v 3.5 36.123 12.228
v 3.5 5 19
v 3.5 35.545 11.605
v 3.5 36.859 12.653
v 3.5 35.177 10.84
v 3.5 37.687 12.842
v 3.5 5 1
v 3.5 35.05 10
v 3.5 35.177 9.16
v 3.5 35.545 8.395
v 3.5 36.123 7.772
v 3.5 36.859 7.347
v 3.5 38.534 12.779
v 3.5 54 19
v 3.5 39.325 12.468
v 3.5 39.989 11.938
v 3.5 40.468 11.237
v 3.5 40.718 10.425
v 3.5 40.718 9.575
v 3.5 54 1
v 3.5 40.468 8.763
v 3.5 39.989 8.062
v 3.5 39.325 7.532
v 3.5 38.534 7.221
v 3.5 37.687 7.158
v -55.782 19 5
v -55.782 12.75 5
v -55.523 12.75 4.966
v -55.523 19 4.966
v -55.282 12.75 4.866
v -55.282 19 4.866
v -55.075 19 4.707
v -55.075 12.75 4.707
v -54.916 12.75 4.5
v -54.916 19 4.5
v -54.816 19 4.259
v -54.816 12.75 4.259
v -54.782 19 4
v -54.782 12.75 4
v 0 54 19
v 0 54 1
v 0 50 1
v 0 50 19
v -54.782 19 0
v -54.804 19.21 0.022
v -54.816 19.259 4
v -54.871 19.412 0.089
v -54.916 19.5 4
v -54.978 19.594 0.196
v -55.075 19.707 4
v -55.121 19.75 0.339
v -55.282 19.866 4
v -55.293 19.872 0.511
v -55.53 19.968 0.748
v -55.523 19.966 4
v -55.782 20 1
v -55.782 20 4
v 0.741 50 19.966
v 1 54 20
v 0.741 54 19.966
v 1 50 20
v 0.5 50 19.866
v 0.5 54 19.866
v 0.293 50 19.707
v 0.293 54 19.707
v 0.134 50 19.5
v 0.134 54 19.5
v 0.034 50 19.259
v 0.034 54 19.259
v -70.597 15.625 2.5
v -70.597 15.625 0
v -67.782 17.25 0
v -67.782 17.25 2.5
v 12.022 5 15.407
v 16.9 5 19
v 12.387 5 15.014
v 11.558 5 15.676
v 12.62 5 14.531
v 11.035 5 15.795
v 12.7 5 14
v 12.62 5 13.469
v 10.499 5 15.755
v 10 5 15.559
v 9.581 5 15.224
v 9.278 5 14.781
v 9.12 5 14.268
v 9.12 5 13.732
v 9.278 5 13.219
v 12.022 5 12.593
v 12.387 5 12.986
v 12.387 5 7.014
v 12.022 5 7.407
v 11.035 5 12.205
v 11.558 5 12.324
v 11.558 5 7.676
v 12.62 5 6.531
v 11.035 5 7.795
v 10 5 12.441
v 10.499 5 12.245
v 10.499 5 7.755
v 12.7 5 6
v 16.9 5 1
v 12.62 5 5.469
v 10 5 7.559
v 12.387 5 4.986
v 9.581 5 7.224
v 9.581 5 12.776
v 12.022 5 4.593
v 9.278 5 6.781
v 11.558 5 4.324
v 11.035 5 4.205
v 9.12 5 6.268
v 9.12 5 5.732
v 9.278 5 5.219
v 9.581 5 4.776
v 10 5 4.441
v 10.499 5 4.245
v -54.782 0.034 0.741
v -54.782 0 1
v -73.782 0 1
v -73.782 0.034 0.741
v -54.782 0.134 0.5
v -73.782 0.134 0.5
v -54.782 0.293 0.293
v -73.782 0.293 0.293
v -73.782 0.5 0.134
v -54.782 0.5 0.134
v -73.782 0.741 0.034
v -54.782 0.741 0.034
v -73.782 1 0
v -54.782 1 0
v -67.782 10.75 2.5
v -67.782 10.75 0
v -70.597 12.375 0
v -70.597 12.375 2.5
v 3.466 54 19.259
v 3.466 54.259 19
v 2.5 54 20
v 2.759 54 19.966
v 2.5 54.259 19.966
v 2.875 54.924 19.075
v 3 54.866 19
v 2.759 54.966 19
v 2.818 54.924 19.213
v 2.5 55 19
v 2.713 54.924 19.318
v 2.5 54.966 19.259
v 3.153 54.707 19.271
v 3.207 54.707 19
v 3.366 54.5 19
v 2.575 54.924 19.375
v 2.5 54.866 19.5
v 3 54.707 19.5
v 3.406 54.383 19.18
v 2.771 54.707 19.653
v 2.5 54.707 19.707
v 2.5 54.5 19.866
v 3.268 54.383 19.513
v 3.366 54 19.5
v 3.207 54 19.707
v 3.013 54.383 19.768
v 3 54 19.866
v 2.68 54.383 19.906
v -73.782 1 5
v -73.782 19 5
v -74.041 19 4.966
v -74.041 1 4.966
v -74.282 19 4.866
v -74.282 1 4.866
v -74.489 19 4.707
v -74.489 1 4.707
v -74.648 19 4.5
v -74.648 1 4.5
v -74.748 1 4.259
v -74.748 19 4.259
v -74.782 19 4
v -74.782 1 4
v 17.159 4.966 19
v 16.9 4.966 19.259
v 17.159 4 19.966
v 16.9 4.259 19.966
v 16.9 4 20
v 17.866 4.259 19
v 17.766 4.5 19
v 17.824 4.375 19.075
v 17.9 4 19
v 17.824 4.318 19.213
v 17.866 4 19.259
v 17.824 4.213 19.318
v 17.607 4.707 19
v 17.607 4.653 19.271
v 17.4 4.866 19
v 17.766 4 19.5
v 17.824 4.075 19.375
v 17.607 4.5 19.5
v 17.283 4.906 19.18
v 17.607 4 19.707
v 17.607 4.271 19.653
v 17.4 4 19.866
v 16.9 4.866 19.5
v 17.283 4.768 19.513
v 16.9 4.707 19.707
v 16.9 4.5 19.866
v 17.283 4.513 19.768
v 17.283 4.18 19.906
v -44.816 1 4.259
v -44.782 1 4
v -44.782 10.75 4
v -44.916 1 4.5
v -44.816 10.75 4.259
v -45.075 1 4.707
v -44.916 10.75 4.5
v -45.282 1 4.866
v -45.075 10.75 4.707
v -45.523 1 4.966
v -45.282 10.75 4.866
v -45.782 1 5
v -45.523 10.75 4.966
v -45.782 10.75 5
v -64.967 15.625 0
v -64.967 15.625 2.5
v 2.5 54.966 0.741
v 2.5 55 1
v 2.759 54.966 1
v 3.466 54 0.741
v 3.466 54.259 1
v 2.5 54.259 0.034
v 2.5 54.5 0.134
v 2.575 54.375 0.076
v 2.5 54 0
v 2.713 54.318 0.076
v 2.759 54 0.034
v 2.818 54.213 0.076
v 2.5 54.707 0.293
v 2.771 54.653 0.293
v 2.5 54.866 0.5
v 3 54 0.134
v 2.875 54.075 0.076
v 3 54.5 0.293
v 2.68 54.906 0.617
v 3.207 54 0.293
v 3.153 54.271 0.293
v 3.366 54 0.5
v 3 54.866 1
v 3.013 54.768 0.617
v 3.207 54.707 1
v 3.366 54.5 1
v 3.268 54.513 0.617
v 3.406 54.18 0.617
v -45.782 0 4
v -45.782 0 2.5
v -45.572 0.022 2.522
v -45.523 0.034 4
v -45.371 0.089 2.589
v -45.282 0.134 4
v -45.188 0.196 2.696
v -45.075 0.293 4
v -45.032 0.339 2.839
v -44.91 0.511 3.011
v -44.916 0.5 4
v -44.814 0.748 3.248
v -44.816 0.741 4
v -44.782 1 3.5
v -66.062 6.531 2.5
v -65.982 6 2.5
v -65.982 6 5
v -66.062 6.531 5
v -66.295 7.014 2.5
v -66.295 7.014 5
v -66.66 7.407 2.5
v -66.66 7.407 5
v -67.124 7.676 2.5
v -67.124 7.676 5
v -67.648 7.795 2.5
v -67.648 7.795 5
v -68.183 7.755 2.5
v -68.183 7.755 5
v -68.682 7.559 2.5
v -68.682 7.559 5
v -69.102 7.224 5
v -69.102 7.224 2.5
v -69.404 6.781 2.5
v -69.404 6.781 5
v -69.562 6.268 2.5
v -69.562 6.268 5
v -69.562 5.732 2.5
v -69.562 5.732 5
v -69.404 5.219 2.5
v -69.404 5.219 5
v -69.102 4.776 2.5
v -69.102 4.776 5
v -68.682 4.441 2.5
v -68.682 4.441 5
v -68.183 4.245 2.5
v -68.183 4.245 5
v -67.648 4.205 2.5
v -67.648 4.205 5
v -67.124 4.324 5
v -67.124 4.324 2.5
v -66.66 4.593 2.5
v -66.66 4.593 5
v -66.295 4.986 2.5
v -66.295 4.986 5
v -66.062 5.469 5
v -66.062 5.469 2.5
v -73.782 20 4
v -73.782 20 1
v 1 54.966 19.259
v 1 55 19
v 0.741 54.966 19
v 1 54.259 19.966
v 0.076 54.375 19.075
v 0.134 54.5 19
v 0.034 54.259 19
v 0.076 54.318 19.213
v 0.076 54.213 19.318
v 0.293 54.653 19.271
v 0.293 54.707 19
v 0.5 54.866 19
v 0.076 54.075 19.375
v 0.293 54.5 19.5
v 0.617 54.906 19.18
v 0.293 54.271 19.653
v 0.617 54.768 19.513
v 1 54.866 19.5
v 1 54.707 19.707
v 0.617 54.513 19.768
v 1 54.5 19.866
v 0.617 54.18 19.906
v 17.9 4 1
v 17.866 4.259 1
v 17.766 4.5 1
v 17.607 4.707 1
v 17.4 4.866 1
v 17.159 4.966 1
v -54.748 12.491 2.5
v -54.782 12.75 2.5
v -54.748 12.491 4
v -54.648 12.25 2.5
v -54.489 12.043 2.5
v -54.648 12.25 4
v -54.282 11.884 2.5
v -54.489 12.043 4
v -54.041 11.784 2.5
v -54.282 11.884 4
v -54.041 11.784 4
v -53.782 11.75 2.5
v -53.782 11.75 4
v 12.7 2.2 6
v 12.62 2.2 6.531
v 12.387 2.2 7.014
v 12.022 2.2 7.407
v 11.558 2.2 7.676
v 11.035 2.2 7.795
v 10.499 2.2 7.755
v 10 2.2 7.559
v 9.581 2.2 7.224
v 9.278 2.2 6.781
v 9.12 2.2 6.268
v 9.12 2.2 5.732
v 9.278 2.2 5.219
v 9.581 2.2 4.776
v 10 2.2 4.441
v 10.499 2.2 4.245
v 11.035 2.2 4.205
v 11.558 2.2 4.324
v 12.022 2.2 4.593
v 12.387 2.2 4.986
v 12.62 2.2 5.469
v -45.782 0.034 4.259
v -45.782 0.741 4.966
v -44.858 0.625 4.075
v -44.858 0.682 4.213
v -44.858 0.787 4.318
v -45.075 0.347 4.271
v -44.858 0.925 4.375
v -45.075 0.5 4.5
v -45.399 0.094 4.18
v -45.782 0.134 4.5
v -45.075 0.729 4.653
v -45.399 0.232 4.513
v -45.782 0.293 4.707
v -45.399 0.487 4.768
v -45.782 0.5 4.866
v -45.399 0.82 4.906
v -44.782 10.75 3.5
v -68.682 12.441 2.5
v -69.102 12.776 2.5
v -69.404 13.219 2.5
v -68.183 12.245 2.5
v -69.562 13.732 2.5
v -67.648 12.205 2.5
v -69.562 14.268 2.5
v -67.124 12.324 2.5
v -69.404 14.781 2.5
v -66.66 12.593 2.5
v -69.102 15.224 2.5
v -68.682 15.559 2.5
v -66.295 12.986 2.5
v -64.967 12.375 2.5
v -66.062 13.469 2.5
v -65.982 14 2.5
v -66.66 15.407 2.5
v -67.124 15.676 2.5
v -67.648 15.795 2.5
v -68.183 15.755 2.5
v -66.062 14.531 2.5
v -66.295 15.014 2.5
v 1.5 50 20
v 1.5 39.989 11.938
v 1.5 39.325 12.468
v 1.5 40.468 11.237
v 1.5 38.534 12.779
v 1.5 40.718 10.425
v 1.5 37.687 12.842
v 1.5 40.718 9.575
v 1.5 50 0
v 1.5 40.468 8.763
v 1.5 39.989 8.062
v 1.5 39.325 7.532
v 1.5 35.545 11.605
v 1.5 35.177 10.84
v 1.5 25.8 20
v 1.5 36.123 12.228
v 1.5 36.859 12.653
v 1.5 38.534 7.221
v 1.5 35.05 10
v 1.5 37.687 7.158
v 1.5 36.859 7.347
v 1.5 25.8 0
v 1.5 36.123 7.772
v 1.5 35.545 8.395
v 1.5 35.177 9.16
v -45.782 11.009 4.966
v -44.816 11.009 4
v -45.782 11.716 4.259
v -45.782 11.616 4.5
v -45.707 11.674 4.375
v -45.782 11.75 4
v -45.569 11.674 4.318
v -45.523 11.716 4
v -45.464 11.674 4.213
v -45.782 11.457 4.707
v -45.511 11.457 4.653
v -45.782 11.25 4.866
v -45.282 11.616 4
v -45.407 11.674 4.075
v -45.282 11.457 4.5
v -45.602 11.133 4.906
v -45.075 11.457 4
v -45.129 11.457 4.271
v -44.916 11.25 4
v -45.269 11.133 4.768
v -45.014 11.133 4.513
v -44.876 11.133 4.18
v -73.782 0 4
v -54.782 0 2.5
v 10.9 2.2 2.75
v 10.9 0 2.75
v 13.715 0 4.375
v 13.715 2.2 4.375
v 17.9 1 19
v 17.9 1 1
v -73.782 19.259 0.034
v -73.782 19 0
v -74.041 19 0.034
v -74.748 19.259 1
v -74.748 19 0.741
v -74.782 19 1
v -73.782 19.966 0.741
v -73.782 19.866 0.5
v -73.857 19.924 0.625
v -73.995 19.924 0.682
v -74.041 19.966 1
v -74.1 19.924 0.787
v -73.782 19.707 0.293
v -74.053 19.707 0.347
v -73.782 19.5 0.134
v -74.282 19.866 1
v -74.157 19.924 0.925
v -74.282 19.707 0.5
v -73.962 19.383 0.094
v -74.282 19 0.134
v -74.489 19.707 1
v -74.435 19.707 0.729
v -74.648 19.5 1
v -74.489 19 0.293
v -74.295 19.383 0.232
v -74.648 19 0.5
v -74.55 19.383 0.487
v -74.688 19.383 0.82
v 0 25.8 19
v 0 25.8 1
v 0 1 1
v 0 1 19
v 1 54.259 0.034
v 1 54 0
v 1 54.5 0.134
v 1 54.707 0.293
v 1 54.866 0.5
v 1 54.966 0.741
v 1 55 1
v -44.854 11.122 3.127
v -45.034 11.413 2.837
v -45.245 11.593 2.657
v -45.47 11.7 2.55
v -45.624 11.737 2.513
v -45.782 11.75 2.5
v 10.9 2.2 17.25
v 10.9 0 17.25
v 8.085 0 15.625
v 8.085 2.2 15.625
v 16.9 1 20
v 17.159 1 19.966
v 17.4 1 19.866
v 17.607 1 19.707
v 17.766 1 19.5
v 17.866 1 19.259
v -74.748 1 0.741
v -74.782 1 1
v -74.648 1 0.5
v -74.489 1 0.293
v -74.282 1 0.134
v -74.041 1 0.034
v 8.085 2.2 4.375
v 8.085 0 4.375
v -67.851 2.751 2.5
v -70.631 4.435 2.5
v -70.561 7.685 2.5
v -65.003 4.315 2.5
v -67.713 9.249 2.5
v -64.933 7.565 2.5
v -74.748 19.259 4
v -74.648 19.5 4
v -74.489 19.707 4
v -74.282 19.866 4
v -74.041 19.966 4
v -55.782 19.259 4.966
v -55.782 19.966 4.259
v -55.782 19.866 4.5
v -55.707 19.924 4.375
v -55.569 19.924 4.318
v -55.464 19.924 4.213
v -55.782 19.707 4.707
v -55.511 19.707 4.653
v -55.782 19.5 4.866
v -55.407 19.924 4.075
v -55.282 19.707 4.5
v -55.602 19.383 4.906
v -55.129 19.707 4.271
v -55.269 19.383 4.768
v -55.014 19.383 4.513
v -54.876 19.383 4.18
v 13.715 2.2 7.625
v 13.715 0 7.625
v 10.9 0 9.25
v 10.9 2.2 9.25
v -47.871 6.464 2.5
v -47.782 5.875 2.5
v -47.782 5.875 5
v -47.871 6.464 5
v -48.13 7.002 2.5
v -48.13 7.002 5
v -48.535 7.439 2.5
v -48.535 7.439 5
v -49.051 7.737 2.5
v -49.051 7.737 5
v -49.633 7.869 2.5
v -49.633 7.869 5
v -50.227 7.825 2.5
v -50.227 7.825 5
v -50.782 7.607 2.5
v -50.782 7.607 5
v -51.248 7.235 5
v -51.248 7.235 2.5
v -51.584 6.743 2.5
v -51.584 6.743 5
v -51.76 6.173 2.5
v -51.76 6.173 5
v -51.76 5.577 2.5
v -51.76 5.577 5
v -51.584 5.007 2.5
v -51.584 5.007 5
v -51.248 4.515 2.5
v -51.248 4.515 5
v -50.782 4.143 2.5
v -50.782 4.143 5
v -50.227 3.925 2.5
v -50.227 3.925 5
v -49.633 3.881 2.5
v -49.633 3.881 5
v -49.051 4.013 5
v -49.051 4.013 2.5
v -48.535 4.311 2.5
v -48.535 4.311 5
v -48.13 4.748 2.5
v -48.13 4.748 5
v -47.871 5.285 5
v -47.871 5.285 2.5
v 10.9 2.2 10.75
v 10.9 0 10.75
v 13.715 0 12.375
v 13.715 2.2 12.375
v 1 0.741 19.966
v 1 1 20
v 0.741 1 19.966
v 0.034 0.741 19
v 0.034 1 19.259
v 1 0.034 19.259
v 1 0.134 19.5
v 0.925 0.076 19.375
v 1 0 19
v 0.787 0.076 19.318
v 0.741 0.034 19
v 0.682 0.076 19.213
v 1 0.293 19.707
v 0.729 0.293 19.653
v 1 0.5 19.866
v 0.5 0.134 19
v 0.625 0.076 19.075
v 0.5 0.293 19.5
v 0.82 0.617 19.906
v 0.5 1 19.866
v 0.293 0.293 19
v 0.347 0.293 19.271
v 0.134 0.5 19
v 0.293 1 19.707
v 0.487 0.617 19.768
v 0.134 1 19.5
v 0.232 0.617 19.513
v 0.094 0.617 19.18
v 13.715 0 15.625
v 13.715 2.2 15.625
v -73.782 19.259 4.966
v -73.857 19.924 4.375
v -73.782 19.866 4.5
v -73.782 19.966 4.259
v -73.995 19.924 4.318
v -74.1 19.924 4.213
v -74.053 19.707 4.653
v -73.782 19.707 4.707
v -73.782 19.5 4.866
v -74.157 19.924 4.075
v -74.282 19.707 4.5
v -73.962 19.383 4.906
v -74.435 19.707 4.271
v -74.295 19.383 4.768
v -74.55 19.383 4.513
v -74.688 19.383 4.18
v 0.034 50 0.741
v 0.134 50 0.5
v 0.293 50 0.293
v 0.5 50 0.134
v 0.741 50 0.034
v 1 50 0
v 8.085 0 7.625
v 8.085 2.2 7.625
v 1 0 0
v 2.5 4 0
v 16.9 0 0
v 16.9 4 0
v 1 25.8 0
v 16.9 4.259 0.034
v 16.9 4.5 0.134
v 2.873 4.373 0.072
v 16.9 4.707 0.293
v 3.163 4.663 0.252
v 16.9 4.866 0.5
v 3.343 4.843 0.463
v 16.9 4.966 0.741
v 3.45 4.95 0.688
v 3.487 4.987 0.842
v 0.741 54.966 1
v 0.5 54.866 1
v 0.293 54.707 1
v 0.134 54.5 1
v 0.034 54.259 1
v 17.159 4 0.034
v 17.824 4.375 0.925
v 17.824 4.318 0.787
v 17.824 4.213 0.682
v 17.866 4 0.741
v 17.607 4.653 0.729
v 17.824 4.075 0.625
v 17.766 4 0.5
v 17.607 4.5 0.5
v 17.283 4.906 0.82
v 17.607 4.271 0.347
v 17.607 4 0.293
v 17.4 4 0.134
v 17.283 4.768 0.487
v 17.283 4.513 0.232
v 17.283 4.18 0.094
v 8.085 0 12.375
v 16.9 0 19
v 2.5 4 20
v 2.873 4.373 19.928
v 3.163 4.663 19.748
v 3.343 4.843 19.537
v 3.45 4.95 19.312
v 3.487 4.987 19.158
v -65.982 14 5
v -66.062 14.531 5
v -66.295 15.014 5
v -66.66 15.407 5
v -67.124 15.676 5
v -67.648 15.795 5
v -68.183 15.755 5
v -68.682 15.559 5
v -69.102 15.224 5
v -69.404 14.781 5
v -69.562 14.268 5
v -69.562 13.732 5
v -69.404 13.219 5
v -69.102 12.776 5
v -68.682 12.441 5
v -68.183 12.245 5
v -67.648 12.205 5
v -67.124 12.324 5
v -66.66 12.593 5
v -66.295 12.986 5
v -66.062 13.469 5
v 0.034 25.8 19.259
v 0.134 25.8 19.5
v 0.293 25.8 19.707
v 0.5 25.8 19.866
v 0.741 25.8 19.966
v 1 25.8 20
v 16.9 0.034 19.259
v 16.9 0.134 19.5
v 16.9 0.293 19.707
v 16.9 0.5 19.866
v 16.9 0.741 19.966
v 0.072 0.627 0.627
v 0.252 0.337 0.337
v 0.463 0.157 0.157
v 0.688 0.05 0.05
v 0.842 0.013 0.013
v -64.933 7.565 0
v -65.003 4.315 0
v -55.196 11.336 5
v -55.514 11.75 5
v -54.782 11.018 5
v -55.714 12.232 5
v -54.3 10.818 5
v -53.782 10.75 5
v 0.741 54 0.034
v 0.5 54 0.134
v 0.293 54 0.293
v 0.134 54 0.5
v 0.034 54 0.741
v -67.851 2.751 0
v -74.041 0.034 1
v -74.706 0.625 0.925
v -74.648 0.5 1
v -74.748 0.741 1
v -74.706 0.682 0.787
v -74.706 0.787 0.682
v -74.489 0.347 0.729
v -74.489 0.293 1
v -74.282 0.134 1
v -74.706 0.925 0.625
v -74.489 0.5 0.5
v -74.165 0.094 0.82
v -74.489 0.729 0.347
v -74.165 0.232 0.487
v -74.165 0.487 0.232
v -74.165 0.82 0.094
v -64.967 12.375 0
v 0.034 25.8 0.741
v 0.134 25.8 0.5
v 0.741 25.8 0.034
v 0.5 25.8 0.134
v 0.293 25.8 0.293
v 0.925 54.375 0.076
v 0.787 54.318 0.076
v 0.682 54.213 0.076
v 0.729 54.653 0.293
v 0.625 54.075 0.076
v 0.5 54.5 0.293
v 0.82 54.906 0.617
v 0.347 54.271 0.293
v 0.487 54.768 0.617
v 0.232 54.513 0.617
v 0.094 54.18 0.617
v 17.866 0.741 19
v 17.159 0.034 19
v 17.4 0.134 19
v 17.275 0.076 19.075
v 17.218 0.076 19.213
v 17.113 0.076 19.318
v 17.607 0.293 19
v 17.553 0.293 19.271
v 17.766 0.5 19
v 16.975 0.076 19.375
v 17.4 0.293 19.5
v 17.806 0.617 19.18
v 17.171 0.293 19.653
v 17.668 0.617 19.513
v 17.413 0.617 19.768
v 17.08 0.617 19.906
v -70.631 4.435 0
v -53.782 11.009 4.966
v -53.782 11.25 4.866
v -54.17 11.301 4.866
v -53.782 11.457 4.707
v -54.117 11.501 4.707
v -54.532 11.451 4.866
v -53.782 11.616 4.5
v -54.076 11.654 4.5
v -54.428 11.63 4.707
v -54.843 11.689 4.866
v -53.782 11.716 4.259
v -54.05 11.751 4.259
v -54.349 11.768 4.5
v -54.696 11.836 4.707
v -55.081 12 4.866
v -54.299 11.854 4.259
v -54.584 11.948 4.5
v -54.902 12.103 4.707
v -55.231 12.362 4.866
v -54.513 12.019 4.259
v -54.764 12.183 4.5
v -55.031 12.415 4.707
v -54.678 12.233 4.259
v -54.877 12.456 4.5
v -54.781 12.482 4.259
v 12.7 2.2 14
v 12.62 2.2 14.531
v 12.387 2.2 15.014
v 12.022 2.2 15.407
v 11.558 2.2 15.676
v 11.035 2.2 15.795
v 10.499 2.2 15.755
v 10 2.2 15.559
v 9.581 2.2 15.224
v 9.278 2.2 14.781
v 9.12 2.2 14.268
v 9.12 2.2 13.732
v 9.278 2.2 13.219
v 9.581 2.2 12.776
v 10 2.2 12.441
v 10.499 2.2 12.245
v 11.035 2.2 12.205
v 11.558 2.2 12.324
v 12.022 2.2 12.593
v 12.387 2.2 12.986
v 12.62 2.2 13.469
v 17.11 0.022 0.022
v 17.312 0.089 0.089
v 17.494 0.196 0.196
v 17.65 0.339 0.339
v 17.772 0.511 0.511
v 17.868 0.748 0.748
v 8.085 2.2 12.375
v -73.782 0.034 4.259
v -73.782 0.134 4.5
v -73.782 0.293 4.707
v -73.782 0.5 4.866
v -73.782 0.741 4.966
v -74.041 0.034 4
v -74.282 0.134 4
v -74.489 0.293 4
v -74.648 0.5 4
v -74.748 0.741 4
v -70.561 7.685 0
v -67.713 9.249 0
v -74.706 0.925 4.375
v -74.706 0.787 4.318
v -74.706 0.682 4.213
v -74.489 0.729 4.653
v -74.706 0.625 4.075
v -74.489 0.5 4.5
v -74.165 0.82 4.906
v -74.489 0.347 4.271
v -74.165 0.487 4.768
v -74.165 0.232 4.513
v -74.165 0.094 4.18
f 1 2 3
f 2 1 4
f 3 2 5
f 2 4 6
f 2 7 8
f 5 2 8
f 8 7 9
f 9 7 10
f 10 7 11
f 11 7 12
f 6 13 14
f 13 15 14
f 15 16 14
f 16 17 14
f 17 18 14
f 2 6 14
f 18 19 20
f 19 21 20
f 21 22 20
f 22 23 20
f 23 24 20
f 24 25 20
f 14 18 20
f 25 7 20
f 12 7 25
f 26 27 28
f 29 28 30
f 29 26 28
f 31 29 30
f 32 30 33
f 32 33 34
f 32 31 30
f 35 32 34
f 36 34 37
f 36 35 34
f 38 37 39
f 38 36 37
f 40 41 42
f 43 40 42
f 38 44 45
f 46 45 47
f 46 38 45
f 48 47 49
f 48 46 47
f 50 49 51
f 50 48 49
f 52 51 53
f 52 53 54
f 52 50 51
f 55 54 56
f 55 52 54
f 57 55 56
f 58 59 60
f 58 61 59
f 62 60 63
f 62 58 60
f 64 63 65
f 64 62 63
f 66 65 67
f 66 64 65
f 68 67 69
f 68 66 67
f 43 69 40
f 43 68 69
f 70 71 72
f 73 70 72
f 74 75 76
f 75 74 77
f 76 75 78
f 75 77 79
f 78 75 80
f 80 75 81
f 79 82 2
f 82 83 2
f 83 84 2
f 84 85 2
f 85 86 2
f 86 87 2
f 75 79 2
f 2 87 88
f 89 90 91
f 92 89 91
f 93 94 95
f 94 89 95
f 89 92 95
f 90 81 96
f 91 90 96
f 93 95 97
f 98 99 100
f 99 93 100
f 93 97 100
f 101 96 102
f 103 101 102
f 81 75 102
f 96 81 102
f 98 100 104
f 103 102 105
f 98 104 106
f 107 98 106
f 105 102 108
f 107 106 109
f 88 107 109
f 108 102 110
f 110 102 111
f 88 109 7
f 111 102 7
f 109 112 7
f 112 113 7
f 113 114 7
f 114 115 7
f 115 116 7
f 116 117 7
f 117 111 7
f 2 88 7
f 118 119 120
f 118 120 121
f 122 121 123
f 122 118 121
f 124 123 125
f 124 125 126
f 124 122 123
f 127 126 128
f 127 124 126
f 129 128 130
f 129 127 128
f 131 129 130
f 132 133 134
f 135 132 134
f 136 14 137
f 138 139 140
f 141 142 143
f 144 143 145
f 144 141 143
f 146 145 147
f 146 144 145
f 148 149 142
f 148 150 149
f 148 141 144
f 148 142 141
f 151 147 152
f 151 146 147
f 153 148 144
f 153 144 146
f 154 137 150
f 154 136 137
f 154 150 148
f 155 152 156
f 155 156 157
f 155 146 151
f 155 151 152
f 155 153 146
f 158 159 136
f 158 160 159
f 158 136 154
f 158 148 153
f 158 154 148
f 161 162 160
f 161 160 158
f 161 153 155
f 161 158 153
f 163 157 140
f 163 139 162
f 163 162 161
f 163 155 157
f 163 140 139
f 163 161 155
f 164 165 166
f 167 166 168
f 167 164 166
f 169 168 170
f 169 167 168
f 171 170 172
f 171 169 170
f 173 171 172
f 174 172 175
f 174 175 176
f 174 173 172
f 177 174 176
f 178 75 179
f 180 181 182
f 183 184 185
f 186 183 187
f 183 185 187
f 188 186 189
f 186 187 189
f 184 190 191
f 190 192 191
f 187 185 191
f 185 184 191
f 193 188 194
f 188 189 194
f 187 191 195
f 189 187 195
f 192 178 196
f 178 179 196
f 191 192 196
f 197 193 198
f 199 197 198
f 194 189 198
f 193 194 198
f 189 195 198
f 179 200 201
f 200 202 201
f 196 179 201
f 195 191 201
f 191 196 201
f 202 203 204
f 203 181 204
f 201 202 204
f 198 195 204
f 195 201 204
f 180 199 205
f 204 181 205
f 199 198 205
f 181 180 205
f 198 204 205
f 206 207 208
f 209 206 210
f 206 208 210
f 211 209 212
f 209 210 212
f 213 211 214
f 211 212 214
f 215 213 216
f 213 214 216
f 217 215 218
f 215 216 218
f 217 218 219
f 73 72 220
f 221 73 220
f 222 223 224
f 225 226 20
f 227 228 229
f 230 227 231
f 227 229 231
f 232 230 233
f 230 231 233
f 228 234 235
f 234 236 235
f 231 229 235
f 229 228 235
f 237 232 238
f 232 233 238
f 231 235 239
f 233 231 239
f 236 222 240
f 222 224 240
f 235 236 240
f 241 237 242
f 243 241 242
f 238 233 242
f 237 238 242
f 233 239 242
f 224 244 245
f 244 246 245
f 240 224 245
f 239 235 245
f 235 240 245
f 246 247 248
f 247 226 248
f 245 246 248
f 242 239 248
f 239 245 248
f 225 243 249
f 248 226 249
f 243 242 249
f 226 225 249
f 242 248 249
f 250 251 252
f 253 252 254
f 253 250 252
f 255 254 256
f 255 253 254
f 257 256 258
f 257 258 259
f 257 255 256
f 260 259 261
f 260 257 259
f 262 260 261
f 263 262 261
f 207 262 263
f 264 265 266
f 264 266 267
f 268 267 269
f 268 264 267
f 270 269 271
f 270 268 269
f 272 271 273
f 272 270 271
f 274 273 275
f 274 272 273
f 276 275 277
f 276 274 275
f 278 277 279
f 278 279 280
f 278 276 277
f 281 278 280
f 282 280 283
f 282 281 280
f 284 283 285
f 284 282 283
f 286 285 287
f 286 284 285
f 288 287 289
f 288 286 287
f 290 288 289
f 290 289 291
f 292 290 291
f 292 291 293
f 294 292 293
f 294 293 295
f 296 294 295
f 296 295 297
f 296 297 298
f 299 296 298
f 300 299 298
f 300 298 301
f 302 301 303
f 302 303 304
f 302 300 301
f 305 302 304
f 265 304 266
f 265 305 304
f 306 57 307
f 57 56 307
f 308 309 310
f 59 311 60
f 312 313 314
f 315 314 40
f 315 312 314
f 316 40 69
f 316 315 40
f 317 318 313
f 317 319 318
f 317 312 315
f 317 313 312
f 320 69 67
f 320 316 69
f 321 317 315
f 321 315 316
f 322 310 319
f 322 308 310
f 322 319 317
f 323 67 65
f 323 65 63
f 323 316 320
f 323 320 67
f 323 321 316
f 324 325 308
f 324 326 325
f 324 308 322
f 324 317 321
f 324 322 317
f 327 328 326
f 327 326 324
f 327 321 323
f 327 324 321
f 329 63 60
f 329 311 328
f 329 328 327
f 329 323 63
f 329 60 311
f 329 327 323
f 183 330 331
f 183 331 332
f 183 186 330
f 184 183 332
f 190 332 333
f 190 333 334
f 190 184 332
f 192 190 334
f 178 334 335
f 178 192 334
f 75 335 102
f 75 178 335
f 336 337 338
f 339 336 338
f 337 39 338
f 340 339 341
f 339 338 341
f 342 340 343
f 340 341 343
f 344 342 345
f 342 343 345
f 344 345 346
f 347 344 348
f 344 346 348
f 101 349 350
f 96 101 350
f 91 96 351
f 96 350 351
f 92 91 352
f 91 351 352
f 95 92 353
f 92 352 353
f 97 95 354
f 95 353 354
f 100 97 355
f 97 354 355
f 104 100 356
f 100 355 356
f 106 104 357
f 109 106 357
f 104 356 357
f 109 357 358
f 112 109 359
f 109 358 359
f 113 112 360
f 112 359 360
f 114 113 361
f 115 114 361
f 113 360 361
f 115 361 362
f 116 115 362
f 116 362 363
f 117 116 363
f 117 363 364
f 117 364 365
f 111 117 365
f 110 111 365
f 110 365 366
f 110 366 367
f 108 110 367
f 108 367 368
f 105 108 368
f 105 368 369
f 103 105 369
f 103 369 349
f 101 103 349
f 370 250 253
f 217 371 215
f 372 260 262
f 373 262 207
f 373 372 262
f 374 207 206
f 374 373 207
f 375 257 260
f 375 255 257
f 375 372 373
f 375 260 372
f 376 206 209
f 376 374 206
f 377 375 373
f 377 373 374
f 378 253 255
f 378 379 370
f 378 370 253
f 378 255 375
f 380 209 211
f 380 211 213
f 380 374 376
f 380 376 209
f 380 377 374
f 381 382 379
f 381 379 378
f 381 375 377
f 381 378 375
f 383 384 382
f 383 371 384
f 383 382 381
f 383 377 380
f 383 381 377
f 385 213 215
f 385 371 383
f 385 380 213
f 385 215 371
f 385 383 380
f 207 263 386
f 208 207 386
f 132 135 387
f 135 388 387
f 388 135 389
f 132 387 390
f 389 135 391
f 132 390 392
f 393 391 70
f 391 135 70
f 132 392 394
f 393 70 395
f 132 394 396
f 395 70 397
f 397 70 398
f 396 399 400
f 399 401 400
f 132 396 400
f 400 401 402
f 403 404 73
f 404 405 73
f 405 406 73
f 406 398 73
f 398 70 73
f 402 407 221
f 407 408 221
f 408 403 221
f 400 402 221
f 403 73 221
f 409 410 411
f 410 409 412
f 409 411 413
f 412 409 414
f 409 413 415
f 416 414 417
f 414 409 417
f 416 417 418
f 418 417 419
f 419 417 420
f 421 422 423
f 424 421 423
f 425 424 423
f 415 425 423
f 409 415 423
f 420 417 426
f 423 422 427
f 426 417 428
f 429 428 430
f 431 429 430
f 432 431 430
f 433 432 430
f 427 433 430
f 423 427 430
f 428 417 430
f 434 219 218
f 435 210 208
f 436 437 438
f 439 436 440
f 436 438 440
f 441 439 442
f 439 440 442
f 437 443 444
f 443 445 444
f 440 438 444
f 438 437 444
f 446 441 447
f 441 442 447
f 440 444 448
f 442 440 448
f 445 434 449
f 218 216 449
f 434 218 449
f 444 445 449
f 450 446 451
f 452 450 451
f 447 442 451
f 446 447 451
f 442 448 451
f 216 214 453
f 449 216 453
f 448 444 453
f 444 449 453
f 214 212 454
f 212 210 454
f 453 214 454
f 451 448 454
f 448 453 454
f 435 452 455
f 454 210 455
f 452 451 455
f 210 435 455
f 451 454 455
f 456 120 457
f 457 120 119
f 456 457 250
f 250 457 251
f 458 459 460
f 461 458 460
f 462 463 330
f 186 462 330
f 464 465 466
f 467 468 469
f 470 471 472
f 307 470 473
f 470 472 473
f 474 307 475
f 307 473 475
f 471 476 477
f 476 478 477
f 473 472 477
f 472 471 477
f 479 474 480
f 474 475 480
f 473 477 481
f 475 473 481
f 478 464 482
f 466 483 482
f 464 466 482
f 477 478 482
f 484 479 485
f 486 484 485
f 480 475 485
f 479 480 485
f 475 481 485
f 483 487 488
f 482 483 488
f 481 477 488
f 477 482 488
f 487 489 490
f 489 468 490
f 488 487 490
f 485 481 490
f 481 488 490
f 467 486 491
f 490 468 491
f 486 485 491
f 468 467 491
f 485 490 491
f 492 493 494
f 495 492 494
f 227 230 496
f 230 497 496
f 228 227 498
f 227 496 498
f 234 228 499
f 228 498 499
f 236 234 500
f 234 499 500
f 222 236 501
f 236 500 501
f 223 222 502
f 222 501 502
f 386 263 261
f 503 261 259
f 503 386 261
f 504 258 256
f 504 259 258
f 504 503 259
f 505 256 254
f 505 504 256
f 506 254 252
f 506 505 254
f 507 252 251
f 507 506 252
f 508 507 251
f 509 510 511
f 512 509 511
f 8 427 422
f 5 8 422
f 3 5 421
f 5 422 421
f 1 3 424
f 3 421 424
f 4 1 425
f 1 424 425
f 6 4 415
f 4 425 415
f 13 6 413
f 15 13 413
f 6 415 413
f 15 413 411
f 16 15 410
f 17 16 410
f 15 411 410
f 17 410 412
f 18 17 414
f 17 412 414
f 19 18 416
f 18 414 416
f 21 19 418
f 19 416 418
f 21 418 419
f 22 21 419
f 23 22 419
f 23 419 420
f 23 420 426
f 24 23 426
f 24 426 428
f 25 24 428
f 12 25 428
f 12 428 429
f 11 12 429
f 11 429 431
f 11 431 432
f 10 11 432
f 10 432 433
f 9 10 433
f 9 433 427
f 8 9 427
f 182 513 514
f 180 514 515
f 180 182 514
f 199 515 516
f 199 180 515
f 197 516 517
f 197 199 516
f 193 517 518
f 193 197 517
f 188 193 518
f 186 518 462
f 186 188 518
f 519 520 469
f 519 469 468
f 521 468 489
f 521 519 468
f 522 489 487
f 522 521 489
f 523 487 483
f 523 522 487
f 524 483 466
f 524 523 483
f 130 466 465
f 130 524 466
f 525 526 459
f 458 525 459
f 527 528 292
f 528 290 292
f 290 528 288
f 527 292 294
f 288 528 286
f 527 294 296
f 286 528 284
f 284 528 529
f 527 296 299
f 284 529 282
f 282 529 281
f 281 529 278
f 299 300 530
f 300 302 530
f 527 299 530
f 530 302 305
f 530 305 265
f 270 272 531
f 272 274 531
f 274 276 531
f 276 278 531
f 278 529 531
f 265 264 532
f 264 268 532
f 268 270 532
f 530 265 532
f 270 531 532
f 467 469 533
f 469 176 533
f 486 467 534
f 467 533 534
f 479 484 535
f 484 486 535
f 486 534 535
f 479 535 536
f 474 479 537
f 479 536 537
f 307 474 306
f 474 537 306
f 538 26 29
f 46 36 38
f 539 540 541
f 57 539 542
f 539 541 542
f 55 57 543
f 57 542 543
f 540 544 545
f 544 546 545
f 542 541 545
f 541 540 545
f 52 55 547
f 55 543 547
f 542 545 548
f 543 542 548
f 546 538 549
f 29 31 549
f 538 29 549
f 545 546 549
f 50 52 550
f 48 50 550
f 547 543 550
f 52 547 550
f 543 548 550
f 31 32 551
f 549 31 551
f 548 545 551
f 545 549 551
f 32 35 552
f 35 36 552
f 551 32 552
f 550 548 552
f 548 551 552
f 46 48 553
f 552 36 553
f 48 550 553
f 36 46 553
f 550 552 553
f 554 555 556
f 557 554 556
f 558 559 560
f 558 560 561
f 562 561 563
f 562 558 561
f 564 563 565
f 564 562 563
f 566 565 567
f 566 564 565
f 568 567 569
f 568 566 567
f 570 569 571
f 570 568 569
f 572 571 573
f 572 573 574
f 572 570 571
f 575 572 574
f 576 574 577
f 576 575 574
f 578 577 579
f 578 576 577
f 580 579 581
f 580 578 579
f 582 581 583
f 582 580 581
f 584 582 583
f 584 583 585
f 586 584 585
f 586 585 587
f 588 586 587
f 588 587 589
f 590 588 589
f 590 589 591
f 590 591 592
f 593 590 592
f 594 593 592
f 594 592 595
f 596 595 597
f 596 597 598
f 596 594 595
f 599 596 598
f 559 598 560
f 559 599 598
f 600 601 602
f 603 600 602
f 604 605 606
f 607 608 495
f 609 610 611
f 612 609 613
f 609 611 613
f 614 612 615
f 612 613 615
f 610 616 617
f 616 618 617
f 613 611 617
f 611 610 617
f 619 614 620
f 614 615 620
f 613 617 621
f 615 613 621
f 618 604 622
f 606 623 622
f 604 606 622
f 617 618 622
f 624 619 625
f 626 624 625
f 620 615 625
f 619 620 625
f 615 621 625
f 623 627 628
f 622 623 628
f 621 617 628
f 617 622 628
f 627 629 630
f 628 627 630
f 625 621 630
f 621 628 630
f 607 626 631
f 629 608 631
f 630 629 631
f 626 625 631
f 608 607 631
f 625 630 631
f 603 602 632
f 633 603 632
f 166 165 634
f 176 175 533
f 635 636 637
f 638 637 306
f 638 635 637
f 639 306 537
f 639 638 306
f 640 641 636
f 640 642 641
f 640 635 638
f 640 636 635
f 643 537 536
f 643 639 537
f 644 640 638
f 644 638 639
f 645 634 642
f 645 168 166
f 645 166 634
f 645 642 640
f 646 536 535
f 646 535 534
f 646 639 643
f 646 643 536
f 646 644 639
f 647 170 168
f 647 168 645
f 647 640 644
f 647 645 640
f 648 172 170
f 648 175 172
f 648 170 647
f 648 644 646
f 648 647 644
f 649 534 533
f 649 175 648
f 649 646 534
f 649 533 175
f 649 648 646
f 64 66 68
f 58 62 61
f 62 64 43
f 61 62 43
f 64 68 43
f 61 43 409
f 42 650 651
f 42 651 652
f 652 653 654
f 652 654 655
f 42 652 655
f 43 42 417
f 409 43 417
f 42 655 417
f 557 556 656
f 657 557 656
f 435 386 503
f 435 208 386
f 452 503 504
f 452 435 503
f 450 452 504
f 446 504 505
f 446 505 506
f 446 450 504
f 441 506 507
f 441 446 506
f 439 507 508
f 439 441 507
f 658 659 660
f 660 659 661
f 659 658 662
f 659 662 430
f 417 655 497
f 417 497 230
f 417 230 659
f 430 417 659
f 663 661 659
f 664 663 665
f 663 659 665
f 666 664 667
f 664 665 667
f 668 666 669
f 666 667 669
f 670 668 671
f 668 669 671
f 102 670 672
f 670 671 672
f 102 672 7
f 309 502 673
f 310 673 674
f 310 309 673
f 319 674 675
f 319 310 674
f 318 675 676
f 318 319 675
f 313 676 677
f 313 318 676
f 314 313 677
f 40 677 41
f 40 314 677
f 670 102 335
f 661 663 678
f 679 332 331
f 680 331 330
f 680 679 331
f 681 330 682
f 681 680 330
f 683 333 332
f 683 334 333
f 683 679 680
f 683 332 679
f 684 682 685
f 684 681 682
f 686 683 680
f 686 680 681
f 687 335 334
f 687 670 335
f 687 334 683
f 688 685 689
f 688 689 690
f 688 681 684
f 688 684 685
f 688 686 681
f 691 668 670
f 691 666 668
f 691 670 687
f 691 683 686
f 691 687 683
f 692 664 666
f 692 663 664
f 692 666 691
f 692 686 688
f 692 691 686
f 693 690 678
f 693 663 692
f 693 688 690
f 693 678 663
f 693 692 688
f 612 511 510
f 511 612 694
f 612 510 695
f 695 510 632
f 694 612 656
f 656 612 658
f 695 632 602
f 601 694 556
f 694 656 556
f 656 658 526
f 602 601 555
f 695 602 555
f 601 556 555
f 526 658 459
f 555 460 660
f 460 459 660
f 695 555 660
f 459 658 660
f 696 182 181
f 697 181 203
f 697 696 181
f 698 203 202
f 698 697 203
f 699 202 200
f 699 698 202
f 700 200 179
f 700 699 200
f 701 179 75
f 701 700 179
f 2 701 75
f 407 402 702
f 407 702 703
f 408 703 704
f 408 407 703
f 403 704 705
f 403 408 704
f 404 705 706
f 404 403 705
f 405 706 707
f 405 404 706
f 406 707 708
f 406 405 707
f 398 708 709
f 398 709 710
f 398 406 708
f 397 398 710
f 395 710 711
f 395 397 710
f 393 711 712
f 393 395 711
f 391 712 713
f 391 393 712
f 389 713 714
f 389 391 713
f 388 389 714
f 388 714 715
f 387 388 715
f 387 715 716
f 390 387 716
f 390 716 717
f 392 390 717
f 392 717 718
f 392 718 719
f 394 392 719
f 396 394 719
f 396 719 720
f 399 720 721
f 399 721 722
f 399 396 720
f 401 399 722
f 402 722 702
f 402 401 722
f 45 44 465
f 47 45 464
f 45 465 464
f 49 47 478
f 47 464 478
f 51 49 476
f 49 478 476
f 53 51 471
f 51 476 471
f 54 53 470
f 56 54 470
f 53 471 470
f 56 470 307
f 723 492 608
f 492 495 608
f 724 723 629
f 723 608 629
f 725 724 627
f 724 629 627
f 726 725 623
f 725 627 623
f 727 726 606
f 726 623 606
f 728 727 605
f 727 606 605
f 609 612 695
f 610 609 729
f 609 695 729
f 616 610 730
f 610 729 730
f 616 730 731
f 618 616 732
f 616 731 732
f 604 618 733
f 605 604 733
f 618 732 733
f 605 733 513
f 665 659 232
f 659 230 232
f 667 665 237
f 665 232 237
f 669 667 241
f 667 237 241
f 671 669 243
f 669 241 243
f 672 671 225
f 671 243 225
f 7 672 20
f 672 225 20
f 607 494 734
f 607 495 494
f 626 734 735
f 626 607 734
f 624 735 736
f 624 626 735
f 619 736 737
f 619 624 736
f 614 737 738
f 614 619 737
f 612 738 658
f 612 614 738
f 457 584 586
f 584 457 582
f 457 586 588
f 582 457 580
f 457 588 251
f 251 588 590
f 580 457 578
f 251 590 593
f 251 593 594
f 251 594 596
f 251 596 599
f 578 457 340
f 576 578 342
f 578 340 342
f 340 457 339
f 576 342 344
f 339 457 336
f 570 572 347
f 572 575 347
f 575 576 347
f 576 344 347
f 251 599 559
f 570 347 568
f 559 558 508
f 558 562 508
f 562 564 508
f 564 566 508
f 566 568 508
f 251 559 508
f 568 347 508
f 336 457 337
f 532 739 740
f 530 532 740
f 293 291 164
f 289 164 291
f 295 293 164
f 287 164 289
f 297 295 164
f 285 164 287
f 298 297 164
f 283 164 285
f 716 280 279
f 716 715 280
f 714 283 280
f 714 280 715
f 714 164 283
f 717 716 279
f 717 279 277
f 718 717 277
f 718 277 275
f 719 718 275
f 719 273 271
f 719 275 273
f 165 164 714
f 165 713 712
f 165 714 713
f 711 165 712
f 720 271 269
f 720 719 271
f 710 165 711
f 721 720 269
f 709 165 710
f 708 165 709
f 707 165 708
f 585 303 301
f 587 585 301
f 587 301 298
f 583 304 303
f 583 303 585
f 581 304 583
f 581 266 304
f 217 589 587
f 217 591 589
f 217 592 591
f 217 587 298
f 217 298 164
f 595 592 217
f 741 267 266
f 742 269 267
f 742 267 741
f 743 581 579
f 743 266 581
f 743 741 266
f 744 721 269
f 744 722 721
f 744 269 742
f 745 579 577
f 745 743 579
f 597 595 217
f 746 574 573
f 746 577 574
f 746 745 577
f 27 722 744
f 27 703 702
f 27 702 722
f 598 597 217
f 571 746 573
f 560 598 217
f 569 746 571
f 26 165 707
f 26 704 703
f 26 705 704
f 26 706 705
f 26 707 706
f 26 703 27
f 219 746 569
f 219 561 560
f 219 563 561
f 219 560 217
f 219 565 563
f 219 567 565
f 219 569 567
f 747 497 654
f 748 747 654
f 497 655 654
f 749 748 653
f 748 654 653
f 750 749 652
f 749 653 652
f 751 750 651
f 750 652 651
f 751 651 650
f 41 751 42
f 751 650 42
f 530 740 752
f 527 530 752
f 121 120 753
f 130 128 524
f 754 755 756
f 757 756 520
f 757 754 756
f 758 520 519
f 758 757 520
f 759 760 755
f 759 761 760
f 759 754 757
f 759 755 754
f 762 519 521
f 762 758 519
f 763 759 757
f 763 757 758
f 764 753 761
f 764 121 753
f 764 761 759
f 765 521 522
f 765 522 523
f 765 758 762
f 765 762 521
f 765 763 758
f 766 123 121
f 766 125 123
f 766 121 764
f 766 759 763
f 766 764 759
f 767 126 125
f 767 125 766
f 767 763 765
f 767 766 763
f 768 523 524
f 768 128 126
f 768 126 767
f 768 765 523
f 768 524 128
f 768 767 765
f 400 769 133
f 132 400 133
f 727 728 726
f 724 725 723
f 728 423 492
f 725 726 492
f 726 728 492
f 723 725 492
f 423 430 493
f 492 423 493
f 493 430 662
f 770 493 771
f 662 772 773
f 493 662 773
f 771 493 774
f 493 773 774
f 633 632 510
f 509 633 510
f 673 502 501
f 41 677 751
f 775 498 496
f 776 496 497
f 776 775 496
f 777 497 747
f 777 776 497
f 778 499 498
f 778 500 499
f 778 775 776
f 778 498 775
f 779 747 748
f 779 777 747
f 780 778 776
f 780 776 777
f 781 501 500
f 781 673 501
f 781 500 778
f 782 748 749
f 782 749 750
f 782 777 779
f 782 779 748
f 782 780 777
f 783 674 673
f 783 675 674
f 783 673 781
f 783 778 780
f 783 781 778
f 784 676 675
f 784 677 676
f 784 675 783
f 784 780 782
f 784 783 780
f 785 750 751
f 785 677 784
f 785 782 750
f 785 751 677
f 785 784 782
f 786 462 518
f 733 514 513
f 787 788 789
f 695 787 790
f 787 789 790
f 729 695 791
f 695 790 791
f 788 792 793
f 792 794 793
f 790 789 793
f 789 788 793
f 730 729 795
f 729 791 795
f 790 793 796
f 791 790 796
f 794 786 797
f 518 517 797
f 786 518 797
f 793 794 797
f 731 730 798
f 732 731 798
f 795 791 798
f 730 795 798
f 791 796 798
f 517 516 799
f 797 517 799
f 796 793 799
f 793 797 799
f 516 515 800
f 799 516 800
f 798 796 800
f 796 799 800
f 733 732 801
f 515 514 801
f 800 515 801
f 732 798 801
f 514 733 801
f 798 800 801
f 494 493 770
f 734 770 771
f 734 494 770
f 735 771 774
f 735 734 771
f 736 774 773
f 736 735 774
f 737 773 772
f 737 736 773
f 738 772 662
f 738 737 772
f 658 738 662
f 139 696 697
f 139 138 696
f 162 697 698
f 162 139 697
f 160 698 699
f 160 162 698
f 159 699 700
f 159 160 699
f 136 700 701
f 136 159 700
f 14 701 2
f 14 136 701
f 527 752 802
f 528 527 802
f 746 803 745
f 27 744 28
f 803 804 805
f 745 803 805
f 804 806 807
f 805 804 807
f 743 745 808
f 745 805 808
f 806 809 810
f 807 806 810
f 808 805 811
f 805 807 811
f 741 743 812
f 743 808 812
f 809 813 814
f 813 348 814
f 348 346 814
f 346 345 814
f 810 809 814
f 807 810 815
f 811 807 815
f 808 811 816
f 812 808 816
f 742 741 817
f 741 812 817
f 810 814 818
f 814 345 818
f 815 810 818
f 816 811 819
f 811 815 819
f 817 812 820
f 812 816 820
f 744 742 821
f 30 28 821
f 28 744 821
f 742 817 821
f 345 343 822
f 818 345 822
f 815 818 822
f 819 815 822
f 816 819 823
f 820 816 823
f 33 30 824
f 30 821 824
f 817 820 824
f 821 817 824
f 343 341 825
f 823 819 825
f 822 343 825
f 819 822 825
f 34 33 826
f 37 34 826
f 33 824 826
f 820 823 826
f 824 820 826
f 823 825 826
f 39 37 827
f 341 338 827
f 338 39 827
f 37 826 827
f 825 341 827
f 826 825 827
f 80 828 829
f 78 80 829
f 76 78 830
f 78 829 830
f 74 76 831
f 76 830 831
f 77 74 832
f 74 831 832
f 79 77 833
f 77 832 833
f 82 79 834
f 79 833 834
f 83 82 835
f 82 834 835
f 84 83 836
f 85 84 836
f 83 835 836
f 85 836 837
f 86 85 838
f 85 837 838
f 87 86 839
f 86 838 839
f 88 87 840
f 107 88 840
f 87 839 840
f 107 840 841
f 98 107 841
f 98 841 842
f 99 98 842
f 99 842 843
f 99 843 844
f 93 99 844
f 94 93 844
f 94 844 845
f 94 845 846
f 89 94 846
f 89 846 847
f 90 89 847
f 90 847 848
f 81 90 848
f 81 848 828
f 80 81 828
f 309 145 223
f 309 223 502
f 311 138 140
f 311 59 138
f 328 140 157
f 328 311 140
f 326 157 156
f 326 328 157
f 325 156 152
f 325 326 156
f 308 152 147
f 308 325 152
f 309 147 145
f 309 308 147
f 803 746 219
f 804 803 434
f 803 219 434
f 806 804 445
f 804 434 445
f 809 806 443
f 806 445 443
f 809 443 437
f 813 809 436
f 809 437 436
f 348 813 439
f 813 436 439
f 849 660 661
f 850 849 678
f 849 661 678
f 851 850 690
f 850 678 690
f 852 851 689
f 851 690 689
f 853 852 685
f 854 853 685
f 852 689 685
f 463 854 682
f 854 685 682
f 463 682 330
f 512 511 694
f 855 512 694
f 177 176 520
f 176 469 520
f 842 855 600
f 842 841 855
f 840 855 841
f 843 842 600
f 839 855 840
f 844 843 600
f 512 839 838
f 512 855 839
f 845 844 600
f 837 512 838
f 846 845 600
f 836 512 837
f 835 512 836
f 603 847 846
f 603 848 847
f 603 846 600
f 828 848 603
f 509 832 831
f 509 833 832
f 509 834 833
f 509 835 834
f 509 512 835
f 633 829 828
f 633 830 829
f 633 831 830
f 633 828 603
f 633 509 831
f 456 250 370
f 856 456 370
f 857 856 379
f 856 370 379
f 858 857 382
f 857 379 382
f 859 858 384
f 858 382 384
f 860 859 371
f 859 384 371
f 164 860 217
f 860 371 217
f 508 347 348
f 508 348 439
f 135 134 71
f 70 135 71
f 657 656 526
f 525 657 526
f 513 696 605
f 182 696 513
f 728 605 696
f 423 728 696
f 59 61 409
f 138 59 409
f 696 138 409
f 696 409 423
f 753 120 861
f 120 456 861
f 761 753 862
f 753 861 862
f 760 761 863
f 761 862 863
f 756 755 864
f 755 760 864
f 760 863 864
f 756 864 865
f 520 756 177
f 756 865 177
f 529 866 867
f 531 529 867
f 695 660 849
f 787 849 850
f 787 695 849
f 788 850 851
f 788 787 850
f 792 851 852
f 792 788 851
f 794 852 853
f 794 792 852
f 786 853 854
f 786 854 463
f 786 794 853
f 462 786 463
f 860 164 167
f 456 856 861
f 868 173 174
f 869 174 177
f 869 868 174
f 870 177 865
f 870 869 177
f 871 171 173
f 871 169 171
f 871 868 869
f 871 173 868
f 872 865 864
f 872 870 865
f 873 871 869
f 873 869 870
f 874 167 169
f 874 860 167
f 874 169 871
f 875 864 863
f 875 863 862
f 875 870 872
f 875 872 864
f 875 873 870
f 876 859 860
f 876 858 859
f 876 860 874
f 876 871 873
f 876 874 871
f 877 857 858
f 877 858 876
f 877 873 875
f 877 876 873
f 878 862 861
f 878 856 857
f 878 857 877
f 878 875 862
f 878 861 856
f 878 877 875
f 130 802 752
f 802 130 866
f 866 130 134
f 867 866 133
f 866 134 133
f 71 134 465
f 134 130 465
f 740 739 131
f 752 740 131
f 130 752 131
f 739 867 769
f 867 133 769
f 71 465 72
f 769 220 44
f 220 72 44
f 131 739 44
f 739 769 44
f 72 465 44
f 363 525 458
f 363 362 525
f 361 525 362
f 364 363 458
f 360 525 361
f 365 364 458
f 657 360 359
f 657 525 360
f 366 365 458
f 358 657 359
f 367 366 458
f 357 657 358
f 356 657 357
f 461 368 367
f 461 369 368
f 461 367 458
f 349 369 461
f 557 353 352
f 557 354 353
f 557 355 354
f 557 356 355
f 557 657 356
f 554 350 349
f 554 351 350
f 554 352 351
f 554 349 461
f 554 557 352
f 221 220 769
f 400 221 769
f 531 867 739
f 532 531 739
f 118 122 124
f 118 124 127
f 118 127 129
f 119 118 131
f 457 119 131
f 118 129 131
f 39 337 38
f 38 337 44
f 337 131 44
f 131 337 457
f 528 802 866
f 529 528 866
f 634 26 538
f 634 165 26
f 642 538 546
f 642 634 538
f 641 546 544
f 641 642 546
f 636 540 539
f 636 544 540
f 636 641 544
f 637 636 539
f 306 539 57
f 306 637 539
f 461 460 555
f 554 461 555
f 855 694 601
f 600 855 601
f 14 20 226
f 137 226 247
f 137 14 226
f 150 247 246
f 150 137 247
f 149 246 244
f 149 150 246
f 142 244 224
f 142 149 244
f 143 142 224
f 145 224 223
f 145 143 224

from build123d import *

# Parameters (mm, degrees)
F1_DEPTH  = 20
F2_R      = 1.8
F3_DEPTH  = 5
F4_DEPTH  = 2.2
F5_R      = 2.85
F6_DEPTH  = 25
F7_R      = 1
F8_DEPTH  = 5
F9_START  = 2.5
F0_R      = 1.8
F9_DEPTH  = 2.5
F10_START = 2.5
F0_W      = 10
F0_H      = 11.7498254403
F0_R_2    = 2
F10_DEPTH = 2.5
F11_R     = 1


with BuildPart() as f1:
    # F0 (on Top) → F1 (new body)
    with BuildSketch(Plane.XY):
        Polygon((0, 25.8), (0, 0), (17.9, 0), (17.9, 5), (3.5, 5), (3.5, 55), (0, 55), (0, 50), (1.5, 50), (1.5, 25.8), align=None)
    extrude(amount=F1_DEPTH)

    # F2 (on face) → F3 (cut)
    with BuildSketch(Plane.XZ):
        with Locations((10.9, 6)):
            Circle(F2_R)
        with Locations((10.9, 14)):
            Circle(F2_R)
    extrude(amount=-F3_DEPTH, mode=Mode.SUBTRACT)

    # F2 (on face) → F4 (cut)
    with BuildSketch(Plane.XZ):
        Polygon((8.0854174377, 12.375), (10.9, 10.75), (13.7145825623, 12.375), (13.7145825623, 15.625), (10.9, 17.25), (8.0854174377, 15.625), align=None)
        with Locations((10.9, 14)):
            Circle(F2_R, mode=Mode.SUBTRACT)
        Polygon((13.7145825623, 7.625), (10.9, 9.25), (8.0854174377, 7.625), (8.0854174377, 4.375), (10.9, 2.75), (13.7145825623, 4.375), align=None)
        with Locations((10.9, 6)):
            Circle(F2_R, mode=Mode.SUBTRACT)
    extrude(amount=-F4_DEPTH, mode=Mode.SUBTRACT)

    # F5 (on face) → F6 (cut)
    with BuildSketch(Plane(origin=(1.5, 0, 0), x_dir=(0, -1, 0), z_dir=(-1, 0, 0))):
        with Locations((-37.9, 10)):
            Circle(F5_R)
    extrude(amount=-F6_DEPTH, mode=Mode.SUBTRACT)

    # F7
    f7_edges = [f1.edges().sort_by_distance(p)[0] for p in [
        (10.7, 5, 20),
        (3.5, 30, 20),
        (3.5, 55, 10),
        (1.75, 55, 20),
        (0, 55, 10),
        (1.75, 55, 0),
        (3.5, 30, 0),
        (10.7, 5, 0),
        (17.9, 5, 10),
        (17.9, 2.5, 0),
        (17.9, 2.5, 20),
        (17.9, 0, 10),
        (0, 12.9, 20),
        (8.95, 0, 20),
        (0, 52.5, 20),
        (0, 12.9, 0),
        (0, 0, 10),
        (0, 52.5, 0),
    ]]
    fillet(f7_edges, radius=F7_R)


with BuildPart() as f8:
    # F0 (on Top) → F8 (new body)
    with BuildSketch(Plane.XY):
        Polygon((-74.7820213437, 20), (-74.7820213437, 0), (-54.7820213437, 0), (-54.7820213437, 11.7498254403), (-54.7820213437, 20), align=None)
        Polygon((-70.630551196, 4.4352707325), (-70.5613815655, 7.6845345818), (-67.7128517132, 9.2492638493), (-64.9334914914, 7.5647292675), (-65.0026611219, 4.3154654182), (-67.8511909742, 2.7507361507), align=None, mode=Mode.SUBTRACT)
        Polygon((-64.9674387814, 12.375), (-67.7820213437, 10.75), (-70.596603906, 12.375), (-70.596603906, 15.625), (-67.7820213437, 17.25), (-64.9674387814, 15.625), align=None, mode=Mode.SUBTRACT)
    extrude(amount=F8_DEPTH)

    # F0 (on Top) → F9 (join)
    with BuildSketch(Plane.XY.offset(F9_START)):
        Polygon((-67.7128517132, 9.2492638493), (-70.5613815655, 7.6845345818), (-70.630551196, 4.4352707325), (-67.8511909742, 2.7507361507), (-65.0026611219, 4.3154654182), (-64.9334914914, 7.5647292675), align=None)
        with Locations((-67.7820213437, 6)):
            Circle(F0_R, mode=Mode.SUBTRACT)
        Polygon((-70.596603906, 12.375), (-67.7820213437, 10.75), (-64.9674387814, 12.375), (-64.9674387814, 15.625), (-67.7820213437, 17.25), (-70.596603906, 15.625), align=None)
        with Locations((-67.7820213437, 14)):
            Circle(F0_R, mode=Mode.SUBTRACT)
    extrude(amount=F9_DEPTH)

    # F0 (on Top) → F10 (join)
    with BuildSketch(Plane.XY.offset(F10_START)):
        with Locations((-49.7820213437, 5.8749127202)):
            Rectangle(F0_W, F0_H)
        with Locations((-49.7820213437, 5.8749127202)):
            Circle(F0_R_2, mode=Mode.SUBTRACT)
    extrude(amount=F10_DEPTH)

    # F11
    f11_edges = [f8.edges().sort_by_distance(p)[0] for p in [
        (-59.782021, 0, 5),
        (-64.782021, 0, 0),
        (-44.782021, 0, 3.75),
        (-44.782021, 5.874913, 5),
        (-49.782021, 11.749825, 5),
        (-54.782021, 15.874913, 5),
        (-74.782021, 10, 5),
        (-64.782021, 20, 5),
        (-74.782021, 0, 2.5),
        (-74.782021, 10, 0),
        (-44.782021, 5.874913, 2.5),
        (-44.782021, 11.749825, 3.75),
        (-54.782021, 11.749825, 3.75),
        (-64.782021, 20, 0),
        (-54.782021, 20, 2.5),
        (-74.782021, 20, 2.5),
    ]]
    fillet(f11_edges, radius=F11_R)


solid = Compound([f1.part, f8.part])
